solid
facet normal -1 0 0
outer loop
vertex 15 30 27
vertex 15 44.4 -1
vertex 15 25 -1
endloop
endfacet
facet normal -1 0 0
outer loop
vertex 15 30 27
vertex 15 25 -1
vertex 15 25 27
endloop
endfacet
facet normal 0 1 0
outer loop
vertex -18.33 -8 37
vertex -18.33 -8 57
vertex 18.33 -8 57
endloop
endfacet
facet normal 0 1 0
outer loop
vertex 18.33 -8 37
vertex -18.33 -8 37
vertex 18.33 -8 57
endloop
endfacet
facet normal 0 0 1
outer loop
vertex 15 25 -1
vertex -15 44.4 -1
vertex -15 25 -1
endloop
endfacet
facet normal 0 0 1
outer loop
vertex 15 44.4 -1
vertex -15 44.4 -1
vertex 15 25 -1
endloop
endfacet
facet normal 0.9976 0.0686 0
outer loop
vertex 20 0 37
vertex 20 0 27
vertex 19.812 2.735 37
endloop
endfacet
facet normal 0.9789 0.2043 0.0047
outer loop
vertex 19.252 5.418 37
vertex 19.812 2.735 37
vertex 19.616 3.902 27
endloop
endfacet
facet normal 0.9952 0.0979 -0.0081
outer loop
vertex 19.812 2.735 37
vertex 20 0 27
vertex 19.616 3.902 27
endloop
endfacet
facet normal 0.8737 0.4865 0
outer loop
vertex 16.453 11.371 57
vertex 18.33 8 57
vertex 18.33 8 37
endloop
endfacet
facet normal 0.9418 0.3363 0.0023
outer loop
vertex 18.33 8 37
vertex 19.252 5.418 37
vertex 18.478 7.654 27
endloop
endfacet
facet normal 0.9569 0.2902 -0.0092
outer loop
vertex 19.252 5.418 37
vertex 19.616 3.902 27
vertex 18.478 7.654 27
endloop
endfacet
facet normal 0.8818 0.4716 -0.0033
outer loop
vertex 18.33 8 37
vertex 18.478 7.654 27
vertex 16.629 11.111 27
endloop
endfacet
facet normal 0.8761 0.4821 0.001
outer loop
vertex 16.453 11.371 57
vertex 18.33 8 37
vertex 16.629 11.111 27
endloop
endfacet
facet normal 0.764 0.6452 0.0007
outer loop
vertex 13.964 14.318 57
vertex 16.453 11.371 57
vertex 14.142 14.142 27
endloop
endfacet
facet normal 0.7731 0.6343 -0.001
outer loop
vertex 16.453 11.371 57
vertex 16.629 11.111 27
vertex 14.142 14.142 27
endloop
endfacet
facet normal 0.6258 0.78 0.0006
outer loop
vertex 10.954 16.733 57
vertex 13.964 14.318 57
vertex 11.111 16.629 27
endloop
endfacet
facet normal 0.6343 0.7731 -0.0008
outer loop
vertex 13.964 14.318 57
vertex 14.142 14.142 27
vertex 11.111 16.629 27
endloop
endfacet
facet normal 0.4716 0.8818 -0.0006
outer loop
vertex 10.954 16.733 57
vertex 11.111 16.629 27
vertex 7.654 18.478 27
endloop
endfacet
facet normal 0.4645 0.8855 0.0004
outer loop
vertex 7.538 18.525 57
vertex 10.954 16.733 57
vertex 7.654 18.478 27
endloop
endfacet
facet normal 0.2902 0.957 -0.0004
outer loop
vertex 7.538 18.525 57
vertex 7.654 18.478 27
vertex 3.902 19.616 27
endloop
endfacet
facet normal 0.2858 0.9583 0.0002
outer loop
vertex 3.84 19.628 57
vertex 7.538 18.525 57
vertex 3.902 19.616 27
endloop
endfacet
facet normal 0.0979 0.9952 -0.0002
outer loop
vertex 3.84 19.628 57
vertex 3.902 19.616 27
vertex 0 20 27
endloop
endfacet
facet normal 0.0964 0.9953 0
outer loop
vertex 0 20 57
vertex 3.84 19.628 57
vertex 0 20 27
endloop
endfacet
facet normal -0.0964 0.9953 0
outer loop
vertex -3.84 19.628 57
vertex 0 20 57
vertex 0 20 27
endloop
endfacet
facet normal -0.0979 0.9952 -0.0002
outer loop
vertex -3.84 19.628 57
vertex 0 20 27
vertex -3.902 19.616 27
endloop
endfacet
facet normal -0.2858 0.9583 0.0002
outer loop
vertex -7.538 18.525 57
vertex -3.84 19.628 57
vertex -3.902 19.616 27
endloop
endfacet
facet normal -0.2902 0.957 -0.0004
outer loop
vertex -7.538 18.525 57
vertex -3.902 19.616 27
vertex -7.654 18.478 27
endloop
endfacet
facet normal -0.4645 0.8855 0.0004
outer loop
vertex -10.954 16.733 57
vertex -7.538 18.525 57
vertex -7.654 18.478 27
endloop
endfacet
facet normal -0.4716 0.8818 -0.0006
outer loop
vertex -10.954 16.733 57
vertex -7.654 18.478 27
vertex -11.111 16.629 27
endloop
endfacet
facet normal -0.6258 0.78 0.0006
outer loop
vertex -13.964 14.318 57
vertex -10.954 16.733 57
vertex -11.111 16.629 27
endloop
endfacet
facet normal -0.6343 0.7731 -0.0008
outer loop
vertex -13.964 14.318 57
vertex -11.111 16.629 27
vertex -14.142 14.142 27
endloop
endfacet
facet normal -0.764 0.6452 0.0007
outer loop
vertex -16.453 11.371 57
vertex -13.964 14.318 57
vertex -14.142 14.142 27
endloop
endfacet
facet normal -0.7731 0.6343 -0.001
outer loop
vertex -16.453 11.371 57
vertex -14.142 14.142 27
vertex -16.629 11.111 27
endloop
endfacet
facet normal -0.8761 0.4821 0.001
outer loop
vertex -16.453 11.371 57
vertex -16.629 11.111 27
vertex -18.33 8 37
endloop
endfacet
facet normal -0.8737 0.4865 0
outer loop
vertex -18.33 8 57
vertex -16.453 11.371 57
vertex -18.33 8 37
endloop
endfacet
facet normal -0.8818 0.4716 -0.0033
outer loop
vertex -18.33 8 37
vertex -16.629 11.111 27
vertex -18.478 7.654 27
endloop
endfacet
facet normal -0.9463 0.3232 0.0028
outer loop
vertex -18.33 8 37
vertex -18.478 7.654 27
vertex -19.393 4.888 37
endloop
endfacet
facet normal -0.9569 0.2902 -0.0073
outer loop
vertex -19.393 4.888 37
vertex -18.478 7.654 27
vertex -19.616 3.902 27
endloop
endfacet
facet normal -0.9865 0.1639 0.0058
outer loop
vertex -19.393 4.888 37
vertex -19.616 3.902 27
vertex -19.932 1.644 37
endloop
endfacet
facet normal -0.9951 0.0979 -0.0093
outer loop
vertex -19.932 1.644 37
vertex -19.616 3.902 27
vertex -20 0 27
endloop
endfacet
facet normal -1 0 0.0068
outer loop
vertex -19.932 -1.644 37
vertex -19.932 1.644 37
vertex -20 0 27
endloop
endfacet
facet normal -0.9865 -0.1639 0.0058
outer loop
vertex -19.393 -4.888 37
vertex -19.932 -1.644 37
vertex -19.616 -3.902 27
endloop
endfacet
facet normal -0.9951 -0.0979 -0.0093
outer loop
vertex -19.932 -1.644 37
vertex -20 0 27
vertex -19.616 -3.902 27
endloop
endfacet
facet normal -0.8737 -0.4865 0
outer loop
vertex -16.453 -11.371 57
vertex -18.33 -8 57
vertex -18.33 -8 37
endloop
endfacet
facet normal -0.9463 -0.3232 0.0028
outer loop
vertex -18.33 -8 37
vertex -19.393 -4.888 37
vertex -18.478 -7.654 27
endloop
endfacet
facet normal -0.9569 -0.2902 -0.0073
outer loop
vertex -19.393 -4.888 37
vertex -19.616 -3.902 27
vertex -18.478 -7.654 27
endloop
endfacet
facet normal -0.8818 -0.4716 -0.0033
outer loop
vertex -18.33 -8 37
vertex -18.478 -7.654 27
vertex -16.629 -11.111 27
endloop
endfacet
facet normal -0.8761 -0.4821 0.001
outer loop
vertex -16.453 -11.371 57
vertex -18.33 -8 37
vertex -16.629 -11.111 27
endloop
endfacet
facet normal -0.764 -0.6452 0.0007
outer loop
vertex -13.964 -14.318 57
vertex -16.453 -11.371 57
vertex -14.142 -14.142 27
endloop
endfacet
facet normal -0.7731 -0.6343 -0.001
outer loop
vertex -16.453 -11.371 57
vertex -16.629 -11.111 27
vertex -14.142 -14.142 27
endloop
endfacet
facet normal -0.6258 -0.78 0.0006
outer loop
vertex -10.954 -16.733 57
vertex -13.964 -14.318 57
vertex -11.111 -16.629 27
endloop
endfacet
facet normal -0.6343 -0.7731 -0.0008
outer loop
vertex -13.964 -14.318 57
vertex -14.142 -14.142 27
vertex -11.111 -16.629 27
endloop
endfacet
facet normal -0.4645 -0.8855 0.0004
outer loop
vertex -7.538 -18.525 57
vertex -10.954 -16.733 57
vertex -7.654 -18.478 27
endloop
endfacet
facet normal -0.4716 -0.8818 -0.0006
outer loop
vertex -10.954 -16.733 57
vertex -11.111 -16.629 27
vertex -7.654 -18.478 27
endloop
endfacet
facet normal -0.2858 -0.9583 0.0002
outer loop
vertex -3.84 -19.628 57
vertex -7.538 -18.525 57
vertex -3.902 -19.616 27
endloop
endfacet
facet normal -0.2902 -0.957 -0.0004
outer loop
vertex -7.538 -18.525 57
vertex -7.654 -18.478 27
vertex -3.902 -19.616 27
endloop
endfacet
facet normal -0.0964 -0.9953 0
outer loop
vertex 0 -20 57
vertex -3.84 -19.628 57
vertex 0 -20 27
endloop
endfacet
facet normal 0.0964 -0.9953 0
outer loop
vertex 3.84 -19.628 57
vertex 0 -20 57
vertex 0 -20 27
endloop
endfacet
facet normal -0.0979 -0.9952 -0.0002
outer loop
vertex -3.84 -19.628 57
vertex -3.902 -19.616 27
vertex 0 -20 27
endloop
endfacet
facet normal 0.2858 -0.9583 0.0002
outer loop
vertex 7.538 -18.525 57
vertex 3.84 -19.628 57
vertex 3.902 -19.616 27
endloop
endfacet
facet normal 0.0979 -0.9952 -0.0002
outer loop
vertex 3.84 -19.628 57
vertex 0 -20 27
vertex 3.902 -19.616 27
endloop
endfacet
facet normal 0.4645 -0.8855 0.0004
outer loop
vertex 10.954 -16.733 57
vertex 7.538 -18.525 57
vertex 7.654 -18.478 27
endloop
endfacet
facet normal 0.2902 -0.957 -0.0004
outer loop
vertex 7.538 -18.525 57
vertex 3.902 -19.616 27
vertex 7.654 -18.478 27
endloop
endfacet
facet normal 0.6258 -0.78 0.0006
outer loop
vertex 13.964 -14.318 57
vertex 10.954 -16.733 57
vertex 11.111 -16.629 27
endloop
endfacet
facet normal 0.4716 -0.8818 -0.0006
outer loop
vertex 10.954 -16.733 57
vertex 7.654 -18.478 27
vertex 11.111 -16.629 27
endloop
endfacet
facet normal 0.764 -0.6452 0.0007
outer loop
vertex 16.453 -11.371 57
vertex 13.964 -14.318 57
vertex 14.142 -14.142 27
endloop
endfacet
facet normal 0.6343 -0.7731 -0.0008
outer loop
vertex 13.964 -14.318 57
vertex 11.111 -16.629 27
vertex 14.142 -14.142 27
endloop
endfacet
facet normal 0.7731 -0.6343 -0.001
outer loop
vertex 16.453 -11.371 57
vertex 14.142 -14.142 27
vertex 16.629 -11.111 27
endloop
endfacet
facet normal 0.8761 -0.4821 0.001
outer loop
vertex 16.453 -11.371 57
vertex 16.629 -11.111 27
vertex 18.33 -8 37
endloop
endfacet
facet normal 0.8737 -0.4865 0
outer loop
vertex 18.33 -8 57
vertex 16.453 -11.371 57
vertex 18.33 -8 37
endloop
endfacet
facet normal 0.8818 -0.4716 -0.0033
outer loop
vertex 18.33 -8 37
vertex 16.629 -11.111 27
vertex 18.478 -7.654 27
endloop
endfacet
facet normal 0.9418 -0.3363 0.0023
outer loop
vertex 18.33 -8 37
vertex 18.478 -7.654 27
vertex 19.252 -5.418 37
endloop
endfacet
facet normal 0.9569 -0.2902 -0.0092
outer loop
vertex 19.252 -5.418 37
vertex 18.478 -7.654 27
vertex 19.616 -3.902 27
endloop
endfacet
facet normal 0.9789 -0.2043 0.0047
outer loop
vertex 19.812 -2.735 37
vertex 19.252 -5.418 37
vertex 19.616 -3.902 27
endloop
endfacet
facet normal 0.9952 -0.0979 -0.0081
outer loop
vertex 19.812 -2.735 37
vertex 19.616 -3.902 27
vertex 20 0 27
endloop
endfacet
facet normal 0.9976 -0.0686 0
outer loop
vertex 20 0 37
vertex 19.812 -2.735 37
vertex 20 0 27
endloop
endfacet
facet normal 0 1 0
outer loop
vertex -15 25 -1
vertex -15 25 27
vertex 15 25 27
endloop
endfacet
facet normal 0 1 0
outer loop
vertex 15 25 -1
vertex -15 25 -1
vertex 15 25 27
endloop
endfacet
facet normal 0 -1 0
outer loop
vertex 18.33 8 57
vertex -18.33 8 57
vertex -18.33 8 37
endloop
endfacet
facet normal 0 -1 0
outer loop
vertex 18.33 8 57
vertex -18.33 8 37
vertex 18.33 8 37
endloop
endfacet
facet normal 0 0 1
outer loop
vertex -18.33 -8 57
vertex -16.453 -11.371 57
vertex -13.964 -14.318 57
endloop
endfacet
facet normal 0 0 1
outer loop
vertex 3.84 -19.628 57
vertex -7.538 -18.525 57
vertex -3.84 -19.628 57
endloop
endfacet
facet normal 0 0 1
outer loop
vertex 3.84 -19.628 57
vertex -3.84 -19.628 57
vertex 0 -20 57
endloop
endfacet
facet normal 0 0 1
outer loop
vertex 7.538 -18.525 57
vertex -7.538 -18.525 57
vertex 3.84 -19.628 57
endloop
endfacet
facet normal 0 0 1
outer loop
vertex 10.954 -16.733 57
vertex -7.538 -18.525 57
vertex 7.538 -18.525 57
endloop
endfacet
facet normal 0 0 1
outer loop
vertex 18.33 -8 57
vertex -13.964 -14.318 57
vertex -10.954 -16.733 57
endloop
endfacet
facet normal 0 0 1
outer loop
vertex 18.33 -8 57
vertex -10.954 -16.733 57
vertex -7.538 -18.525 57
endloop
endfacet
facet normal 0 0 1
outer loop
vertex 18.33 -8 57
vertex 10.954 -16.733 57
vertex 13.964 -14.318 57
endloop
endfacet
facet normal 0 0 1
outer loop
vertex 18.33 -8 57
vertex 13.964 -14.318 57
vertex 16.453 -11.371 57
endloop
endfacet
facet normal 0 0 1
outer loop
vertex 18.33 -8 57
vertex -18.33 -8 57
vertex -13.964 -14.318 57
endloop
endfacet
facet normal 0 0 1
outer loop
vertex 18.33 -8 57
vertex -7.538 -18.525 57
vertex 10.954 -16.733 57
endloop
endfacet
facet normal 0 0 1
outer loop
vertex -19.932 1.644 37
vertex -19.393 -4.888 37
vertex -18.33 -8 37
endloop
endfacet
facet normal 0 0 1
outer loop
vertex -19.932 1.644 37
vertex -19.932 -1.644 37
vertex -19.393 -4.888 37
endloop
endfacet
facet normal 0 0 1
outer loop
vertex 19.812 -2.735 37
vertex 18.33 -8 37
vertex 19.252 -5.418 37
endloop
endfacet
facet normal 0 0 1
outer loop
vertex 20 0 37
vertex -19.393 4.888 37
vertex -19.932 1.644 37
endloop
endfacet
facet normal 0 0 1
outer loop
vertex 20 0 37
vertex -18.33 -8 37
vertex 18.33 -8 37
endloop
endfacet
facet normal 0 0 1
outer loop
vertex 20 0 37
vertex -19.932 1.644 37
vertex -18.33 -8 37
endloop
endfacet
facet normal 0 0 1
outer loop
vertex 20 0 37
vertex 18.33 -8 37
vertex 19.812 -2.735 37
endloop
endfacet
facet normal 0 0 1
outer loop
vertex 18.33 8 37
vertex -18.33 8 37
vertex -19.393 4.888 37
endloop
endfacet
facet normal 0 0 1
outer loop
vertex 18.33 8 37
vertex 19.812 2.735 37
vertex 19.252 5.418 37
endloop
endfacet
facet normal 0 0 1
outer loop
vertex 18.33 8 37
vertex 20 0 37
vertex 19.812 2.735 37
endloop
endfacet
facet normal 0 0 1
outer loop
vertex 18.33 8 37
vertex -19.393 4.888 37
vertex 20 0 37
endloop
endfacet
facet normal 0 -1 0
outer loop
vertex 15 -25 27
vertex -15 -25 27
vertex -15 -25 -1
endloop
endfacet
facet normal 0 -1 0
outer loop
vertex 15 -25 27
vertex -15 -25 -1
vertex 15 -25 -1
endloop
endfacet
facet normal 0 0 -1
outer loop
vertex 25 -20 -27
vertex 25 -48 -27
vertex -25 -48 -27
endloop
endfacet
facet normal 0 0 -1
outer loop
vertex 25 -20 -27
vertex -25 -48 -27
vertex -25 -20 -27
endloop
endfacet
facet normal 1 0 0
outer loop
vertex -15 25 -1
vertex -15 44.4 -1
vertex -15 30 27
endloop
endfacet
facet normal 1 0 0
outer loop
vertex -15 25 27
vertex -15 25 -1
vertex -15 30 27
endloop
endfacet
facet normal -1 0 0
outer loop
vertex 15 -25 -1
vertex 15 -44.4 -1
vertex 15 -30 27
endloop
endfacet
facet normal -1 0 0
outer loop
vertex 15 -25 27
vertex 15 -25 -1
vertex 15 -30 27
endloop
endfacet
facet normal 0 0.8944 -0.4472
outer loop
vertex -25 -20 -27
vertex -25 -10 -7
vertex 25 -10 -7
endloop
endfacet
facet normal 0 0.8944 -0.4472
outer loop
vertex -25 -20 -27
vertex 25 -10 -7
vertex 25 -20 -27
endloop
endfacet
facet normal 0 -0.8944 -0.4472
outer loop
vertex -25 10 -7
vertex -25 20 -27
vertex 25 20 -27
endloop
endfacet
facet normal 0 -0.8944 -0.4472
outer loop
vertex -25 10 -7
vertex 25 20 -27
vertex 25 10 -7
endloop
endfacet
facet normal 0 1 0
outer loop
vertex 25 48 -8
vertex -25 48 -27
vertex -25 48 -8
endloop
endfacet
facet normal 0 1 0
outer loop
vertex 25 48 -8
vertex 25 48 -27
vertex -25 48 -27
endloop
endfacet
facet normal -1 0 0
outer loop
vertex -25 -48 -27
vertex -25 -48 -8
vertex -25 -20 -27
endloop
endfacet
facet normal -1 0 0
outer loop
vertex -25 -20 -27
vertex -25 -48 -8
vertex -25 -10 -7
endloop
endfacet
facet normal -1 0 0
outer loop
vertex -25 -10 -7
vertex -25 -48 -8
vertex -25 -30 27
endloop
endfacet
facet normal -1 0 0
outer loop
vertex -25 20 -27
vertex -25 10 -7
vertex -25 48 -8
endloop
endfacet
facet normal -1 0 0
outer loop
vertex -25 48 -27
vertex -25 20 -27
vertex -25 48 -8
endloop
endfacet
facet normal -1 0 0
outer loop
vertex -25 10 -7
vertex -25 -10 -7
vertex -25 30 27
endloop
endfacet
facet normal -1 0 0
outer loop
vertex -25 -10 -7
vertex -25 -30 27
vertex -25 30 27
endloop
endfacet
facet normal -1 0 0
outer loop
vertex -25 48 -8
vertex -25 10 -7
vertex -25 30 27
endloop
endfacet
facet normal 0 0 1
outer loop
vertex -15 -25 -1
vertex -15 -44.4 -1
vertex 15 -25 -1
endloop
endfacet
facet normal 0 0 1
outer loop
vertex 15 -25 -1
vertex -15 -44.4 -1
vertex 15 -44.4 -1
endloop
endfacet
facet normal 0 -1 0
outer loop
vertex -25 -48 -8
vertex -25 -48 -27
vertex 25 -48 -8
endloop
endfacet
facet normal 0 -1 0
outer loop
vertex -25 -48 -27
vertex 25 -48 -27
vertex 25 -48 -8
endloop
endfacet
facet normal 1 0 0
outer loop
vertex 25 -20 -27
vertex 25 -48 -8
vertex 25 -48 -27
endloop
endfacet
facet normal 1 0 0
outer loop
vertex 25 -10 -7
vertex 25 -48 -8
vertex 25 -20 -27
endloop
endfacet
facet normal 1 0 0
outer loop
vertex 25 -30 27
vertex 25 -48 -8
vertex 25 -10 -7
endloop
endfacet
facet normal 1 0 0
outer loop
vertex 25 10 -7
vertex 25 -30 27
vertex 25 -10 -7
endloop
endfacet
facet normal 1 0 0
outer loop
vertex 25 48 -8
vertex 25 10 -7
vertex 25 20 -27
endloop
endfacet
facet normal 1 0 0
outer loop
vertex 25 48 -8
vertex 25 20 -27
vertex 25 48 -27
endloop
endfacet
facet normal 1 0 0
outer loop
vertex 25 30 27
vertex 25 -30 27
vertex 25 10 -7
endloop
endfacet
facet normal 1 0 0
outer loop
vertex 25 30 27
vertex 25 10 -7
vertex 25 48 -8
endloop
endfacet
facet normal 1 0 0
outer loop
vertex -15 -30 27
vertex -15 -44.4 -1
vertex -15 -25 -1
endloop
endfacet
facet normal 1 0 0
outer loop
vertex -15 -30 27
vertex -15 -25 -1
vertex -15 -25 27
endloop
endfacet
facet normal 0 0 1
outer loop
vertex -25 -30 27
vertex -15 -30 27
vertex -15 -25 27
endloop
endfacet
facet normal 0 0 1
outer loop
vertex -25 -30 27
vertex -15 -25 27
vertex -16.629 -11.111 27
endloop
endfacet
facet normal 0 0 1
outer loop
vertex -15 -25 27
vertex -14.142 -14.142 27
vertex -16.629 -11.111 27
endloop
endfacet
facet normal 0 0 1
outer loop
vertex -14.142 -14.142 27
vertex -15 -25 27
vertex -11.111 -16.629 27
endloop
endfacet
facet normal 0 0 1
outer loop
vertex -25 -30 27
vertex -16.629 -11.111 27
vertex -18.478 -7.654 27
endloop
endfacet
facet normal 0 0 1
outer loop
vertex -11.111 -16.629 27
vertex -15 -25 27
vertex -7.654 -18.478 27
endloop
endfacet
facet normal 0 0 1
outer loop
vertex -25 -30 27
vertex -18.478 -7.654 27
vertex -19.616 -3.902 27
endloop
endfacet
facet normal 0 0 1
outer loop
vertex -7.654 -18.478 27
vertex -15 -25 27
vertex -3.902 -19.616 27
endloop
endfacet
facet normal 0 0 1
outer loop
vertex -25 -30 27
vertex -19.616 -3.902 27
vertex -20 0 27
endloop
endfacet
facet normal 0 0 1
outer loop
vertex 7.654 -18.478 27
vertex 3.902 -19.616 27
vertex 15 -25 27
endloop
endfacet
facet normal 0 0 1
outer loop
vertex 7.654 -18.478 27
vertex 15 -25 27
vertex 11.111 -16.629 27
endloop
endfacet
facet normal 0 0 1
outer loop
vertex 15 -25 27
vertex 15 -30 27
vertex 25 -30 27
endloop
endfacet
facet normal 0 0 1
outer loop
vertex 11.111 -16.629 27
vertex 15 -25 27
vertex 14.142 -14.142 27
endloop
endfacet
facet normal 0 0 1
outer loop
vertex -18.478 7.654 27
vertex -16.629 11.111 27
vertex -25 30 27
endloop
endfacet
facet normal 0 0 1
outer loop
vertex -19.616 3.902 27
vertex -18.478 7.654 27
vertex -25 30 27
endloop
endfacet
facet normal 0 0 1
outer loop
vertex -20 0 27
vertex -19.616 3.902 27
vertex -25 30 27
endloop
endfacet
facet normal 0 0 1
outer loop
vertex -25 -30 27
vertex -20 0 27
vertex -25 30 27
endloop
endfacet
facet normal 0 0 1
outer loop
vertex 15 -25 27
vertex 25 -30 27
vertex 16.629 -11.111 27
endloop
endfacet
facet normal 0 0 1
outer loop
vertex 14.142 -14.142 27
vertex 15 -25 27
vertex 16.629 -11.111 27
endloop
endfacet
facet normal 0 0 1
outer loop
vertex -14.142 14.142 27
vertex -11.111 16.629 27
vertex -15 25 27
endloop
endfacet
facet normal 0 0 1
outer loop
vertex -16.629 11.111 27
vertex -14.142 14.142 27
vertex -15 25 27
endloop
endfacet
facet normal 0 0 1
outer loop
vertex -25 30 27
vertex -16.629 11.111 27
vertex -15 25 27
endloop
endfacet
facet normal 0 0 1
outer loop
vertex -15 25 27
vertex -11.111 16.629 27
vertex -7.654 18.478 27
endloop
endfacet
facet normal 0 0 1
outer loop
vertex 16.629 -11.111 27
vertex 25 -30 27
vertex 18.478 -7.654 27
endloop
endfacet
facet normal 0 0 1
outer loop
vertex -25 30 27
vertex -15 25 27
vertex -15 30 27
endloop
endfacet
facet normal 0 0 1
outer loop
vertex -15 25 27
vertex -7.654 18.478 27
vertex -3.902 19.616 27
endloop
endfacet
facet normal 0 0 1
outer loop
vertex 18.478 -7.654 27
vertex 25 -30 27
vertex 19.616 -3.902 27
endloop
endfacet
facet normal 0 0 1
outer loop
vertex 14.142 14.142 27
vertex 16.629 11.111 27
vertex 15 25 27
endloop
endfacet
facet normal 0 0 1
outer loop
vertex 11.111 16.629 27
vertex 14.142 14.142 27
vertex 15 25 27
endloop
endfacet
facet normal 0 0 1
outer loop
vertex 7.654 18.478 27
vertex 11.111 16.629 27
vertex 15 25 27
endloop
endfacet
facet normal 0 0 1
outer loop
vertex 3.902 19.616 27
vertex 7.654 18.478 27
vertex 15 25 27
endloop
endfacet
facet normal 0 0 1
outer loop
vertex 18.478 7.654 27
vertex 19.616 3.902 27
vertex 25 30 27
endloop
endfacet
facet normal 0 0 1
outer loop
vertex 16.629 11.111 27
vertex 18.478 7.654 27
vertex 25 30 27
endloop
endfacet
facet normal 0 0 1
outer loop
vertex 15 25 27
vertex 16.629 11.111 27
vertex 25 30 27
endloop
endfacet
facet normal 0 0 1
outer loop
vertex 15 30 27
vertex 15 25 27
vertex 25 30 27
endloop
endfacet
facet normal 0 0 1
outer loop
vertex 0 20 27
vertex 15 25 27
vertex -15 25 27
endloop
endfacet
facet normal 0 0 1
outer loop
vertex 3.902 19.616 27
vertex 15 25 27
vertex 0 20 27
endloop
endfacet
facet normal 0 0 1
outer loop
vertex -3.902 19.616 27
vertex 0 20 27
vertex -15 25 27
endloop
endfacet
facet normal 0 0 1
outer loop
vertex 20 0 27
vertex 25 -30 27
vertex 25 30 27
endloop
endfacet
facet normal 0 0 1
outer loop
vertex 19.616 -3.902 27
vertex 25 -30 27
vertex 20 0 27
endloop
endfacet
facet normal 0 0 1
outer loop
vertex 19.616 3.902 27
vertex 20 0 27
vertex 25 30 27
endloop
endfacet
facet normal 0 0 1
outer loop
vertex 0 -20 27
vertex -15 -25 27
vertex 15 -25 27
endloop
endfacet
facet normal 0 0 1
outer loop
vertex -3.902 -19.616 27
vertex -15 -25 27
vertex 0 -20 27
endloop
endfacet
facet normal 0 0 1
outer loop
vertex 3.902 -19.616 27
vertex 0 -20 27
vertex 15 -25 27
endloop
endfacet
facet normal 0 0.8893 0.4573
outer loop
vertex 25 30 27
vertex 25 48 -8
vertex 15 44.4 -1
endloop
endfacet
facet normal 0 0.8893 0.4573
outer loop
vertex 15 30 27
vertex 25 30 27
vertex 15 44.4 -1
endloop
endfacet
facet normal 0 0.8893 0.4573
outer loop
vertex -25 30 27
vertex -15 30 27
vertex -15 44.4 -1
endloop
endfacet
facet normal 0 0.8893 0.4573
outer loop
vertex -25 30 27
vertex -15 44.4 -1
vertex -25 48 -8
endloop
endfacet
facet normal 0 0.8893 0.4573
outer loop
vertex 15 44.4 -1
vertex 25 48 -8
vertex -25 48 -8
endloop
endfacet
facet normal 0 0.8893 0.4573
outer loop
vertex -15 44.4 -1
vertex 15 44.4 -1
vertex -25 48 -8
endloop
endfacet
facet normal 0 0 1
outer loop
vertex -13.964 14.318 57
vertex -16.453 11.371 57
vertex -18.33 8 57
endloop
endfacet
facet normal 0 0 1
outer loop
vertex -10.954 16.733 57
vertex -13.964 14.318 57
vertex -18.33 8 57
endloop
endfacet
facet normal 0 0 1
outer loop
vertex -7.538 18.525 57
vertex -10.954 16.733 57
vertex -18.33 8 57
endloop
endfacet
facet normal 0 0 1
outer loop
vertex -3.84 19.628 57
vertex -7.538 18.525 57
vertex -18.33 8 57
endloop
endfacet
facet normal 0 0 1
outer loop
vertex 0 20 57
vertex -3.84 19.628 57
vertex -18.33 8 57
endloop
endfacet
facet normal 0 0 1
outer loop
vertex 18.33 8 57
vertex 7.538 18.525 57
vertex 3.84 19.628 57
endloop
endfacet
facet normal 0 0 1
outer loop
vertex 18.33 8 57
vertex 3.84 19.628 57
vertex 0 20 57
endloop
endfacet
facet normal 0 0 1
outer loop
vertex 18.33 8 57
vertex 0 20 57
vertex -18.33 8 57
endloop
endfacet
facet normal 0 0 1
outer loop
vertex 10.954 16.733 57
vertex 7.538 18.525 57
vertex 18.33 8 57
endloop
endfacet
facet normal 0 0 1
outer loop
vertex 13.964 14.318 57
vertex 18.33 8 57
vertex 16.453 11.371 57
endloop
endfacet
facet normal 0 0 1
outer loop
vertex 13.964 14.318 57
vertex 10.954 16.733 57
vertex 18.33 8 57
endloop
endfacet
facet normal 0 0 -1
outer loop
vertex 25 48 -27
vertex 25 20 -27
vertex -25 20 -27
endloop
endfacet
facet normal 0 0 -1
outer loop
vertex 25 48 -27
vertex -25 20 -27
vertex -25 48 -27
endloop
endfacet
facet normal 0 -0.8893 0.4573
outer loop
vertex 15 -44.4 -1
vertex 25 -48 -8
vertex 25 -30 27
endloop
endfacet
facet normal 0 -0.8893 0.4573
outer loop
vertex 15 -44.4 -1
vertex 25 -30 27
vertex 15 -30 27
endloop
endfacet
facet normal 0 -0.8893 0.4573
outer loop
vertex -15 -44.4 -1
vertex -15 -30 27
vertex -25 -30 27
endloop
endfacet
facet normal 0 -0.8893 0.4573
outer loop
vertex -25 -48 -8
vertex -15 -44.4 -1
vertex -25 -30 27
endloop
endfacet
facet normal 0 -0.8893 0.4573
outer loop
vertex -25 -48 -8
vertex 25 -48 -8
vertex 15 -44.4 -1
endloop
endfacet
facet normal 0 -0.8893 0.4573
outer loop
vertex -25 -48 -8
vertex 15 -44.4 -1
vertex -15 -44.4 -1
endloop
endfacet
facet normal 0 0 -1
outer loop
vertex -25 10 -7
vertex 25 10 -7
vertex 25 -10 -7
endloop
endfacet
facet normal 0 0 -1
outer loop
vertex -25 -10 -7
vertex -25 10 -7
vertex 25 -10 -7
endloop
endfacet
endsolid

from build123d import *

# Parameters (mm, degrees)
F0_W      = 96
F0_H      = 54
F1_DEPTH  = 25
F2_SIZE2  = 35
F2_SIZE   = 18
F4_DEPTH  = 50.001
F5_R      = 20
F6_DEPTH  = 30
F7_W      = 40
F7_H      = 16
F8_DEPTH  = 20
F9_W      = 30
F9_H      = 28
F10_DEPTH = 23


# Not quite as in the source:
# - a pattern or mirror of a feature is missing from the dataset's text; its kind, count and spacing are read off the source's solid


with BuildPart() as f1:
    # F0 (on Right) → F1 (new body, symmetric)
    with BuildSketch(Plane.YZ):
        Rectangle(F0_W, F0_H)
    extrude(amount=F1_DEPTH, both=True)

    # F2
    f2_edges = [f1.edges().sort_by_distance(p)[0] for p in [
        (0, -48, 27),
        (0, 48, 27),
    ]]
    f2_side = f1.faces().sort_by_distance((0, 0, 27))[0]
    chamfer(f2_edges, length=F2_SIZE, length2=F2_SIZE2, reference=f2_side)

    # F3 (on face) → F4 (cut, through all)
    with BuildSketch(Plane.YZ.offset(25)):
        Polygon((-10, -7), (-20, -27), (20, -27), (10, -7), align=None)
    extrude(amount=-F4_DEPTH, mode=Mode.SUBTRACT)

    # F5 (on face) → F6 (join)
    with BuildSketch(Plane.XY.offset(27)):
        Circle(F5_R)
    extrude(amount=F6_DEPTH)

    # F7 (on face) → F8 (cut)
    with BuildSketch(Plane.XY.offset(57)):
        Rectangle(F7_W, F7_H)
    extrude(amount=-F8_DEPTH, mode=Mode.SUBTRACT)

    # F9 (on face) → F10 (cut)
    with BuildSketch(Plane.XZ.offset(48)):
        with Locations((0, 13)):
            Rectangle(F9_W, F9_H)
    f10 = extrude(amount=-F10_DEPTH, mode=Mode.SUBTRACT)

    # F10_copies: F10 across plane
    add(f10.mirror(Plane.ZX), mode=Mode.SUBTRACT)


solid = f1.part
